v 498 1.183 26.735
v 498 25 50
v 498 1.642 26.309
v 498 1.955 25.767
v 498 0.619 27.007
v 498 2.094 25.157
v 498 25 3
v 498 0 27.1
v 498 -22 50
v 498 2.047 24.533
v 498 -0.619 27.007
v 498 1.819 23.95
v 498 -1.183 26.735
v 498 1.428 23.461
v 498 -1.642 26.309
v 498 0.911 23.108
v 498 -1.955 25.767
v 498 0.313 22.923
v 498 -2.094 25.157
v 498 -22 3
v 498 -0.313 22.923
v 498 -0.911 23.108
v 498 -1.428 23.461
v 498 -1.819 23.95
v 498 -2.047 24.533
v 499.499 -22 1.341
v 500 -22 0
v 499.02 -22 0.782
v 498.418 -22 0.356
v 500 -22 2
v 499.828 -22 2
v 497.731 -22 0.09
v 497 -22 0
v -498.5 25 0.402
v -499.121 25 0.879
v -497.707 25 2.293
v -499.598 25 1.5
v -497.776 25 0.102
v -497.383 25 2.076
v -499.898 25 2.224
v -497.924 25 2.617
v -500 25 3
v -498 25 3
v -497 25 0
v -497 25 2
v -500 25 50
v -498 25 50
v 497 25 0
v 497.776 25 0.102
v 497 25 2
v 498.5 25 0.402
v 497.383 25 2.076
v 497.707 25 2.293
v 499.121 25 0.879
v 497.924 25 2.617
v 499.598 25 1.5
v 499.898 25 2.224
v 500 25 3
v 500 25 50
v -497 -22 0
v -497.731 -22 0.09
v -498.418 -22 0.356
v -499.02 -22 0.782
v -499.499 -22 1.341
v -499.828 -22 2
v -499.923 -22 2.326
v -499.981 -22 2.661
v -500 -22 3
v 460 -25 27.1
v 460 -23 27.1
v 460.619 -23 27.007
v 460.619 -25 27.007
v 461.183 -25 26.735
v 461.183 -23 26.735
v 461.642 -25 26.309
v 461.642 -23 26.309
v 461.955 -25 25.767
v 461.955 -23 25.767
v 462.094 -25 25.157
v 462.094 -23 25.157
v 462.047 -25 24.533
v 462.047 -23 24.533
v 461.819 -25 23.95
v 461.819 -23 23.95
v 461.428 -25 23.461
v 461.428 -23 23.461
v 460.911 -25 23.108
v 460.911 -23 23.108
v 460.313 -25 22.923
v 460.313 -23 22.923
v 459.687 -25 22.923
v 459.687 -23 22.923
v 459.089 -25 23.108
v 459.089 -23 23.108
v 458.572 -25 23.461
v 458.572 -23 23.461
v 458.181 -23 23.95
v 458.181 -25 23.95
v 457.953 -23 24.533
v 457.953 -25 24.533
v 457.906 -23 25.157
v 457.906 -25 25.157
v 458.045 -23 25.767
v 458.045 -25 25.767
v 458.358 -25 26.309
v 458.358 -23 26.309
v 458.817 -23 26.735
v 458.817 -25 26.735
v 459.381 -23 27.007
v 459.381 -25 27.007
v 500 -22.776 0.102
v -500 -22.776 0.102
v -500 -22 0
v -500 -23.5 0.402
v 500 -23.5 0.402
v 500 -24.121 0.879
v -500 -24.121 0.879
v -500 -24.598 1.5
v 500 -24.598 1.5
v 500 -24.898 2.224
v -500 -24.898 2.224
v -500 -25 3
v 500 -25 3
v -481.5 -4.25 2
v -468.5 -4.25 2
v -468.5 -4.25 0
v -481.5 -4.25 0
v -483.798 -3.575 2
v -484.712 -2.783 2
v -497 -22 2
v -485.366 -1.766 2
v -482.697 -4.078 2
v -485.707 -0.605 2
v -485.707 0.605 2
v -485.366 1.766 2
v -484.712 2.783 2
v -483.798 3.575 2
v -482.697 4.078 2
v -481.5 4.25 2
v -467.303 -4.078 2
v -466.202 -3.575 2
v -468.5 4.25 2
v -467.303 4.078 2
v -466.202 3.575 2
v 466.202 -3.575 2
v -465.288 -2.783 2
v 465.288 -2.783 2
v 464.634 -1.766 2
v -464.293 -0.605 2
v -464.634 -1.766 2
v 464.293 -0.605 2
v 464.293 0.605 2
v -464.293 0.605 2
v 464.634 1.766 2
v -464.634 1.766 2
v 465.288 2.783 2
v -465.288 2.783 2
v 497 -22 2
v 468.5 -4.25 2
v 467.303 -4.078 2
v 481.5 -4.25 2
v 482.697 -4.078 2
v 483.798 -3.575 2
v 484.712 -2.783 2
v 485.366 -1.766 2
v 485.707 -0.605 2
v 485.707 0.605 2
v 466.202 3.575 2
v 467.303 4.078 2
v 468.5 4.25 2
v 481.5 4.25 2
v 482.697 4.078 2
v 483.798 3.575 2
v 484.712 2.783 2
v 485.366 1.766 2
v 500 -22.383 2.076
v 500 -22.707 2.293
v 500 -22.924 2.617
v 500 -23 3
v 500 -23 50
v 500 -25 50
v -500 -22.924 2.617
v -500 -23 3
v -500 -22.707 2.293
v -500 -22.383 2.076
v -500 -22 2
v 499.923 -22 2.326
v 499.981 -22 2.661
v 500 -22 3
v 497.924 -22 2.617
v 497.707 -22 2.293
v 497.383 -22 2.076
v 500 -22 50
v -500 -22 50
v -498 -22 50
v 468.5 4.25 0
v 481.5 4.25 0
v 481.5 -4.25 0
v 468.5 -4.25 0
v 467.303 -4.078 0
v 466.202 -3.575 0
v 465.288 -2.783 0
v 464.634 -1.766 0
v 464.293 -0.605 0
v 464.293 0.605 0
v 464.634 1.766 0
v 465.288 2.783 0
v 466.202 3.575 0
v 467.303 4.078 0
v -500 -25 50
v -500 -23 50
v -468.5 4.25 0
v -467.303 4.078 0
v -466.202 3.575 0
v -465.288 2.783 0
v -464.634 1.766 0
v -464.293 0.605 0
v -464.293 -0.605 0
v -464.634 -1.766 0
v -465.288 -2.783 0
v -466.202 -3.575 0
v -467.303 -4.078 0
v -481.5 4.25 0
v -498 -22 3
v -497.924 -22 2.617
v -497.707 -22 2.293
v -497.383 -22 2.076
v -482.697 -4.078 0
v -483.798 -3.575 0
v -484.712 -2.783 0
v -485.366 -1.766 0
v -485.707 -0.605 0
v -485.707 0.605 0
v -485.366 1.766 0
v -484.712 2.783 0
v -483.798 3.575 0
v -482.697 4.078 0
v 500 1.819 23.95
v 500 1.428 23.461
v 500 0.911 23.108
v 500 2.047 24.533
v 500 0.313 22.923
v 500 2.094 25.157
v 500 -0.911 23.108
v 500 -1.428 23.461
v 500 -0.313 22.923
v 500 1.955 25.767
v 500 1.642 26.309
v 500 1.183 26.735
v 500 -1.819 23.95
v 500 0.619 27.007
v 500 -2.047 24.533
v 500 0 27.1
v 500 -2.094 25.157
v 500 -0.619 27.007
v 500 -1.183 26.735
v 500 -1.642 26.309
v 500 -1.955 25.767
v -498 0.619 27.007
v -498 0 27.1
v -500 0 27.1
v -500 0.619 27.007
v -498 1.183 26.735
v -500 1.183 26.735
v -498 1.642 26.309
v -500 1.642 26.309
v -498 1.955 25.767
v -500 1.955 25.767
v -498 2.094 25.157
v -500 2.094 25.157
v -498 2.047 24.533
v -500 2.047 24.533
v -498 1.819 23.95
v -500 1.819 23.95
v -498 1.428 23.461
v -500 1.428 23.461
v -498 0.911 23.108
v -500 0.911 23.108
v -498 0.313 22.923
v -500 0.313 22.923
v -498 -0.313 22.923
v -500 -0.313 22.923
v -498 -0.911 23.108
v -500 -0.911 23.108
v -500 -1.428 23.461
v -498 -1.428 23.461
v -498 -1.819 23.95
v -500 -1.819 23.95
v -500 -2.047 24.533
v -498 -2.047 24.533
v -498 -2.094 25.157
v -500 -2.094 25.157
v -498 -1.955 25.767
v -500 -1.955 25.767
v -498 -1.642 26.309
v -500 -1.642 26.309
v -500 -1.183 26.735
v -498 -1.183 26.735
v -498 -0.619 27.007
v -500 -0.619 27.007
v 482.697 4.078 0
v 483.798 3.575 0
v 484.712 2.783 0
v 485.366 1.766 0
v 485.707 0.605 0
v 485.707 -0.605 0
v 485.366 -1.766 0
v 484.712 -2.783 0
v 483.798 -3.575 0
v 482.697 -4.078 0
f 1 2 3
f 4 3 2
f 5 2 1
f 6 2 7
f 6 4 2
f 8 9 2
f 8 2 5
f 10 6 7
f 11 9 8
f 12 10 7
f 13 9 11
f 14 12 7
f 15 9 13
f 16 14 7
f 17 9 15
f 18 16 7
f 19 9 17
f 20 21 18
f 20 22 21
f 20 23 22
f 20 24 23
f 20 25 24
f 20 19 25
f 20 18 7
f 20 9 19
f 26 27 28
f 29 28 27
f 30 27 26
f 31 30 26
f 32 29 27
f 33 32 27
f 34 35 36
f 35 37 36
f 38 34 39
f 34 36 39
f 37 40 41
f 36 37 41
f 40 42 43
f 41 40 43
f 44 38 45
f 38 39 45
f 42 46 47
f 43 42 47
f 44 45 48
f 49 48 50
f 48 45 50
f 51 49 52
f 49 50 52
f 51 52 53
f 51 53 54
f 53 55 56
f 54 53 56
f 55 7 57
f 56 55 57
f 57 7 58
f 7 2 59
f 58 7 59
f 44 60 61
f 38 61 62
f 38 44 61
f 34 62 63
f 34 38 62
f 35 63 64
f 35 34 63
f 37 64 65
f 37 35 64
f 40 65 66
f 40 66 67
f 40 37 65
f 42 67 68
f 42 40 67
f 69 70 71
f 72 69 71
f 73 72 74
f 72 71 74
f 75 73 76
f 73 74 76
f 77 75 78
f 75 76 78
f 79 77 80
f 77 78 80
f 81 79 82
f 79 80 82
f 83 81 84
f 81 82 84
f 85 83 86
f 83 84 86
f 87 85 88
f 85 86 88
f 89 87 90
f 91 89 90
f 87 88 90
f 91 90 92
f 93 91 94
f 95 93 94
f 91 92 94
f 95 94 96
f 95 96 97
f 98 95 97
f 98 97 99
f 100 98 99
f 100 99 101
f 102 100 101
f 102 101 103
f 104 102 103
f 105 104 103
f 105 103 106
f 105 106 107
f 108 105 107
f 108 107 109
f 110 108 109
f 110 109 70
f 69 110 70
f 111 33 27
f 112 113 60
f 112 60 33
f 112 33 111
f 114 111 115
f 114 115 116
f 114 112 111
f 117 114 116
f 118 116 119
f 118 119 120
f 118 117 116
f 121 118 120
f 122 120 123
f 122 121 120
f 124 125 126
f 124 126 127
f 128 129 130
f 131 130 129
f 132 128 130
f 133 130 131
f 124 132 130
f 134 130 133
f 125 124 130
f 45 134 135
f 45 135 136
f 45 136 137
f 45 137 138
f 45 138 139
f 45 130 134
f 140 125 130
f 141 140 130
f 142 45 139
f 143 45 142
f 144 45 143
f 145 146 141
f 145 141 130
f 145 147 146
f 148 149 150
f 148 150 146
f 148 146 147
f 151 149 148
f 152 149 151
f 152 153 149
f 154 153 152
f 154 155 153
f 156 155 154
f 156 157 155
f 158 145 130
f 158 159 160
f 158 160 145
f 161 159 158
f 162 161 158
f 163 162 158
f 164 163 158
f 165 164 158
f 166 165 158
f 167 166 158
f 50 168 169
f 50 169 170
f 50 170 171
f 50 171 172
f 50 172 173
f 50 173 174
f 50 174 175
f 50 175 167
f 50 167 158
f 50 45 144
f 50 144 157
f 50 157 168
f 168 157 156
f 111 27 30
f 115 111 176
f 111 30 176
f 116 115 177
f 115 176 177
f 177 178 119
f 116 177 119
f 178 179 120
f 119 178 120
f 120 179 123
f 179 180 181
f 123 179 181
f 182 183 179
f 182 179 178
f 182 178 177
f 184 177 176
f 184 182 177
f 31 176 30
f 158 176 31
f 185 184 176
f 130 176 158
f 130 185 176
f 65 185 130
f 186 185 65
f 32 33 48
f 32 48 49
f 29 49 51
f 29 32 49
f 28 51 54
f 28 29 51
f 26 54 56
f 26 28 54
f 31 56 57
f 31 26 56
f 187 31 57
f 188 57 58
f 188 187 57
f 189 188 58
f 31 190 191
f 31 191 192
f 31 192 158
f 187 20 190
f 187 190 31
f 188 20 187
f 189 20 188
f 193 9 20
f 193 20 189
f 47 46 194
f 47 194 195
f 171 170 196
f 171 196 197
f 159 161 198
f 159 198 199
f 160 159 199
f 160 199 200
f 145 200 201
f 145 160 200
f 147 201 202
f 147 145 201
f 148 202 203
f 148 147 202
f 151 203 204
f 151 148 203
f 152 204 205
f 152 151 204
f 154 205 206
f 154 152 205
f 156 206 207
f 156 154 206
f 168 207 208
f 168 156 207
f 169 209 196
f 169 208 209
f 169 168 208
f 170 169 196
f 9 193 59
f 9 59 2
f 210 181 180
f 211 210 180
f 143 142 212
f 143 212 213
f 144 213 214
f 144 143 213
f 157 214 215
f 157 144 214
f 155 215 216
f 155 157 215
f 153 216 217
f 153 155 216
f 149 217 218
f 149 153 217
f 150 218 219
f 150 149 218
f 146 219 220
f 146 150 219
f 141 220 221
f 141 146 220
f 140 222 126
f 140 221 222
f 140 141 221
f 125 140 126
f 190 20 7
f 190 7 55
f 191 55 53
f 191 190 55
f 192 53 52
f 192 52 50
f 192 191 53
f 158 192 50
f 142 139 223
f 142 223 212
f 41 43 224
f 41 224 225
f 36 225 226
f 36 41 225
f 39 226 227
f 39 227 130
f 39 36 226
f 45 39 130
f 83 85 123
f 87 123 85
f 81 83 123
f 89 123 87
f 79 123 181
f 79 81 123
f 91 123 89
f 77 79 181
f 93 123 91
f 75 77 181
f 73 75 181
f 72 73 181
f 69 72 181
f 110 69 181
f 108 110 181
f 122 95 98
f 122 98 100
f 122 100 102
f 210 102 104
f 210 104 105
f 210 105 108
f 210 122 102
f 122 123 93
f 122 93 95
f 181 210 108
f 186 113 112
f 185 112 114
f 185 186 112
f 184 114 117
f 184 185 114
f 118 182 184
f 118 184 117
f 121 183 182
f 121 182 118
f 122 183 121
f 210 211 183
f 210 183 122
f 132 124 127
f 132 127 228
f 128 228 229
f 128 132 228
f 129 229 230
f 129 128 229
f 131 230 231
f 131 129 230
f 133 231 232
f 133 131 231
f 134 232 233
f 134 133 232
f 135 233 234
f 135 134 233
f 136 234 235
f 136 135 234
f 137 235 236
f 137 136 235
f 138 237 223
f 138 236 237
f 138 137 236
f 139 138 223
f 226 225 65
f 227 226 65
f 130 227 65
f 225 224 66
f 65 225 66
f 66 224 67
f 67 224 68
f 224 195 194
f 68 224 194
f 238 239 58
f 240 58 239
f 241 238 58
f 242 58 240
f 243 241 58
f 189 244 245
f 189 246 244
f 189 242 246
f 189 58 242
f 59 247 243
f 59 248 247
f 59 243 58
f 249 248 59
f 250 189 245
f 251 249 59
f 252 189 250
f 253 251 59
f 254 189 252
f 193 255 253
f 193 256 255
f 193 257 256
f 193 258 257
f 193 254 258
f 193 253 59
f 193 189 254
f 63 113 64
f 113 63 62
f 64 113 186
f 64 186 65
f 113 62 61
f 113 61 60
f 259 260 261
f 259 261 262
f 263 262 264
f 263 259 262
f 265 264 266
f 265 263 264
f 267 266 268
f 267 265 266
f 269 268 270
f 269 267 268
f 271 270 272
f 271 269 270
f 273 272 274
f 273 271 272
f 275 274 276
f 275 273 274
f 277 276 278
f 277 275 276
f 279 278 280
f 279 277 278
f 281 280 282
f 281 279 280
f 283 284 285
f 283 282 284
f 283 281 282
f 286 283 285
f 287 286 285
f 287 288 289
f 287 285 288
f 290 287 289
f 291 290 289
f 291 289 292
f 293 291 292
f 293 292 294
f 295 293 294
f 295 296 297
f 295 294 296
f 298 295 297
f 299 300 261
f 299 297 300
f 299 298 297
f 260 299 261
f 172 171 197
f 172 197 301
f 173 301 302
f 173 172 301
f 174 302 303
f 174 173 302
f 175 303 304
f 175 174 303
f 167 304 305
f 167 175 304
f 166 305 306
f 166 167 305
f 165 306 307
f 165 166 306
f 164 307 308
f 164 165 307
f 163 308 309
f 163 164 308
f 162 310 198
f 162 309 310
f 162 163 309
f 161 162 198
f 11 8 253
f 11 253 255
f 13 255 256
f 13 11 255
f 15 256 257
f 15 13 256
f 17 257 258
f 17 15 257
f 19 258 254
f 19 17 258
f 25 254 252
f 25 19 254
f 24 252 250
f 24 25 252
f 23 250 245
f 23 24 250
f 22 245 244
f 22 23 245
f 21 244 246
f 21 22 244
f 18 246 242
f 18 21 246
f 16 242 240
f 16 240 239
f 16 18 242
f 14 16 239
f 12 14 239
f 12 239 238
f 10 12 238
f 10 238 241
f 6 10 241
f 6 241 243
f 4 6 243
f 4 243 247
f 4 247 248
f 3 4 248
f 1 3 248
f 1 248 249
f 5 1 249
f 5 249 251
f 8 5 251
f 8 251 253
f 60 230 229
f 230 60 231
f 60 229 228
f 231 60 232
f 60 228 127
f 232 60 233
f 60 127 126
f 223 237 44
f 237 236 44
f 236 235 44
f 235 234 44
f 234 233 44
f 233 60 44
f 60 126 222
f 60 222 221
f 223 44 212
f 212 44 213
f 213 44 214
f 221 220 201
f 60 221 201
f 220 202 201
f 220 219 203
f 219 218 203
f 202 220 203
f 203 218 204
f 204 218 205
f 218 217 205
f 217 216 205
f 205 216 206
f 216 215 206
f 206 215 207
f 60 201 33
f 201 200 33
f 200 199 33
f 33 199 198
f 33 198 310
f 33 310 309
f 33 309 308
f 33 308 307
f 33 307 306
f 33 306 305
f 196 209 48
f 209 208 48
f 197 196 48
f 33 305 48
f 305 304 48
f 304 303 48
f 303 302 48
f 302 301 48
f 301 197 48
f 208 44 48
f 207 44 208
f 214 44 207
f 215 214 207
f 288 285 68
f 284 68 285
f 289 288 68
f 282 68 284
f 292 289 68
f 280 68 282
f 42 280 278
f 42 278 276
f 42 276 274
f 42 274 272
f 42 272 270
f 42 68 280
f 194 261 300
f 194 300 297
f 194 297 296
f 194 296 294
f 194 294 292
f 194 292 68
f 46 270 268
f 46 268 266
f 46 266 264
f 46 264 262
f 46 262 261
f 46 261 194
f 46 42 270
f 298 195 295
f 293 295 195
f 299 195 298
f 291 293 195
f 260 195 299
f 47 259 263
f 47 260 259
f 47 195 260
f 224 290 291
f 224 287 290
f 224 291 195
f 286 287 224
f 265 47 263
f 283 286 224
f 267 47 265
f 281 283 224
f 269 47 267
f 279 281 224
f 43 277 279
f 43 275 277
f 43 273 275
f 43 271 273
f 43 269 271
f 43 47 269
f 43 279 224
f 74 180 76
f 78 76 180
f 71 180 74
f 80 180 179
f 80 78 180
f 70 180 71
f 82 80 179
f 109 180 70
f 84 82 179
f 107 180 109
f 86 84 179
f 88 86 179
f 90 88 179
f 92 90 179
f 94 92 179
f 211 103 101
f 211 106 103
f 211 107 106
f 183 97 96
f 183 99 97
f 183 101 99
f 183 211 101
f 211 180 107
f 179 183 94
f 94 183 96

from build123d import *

# Parameters (mm, degrees)
BASEFLANGE_W                 = 1000
BASEFLANGE_H                 = 50
BASEFLANGE1_DEPTH            = 2
EDGE_FLANGE2_STRIP_W         = 10
EDGE_FLANGE2_STRIP_H         = 2
EDGE_FLANGE2_STRIP_CUT_DEPTH = 1000
EDGE_FLANGE2_DEPTH           = 1000
SKETCH12_R                   = 2.1
F_4_2MM_HOLE_DEPTH           = 10
SLOT_1_DEPTH                 = 10
LEFT_EDGE_STRIP_W            = 10
LEFT_EDGE_STRIP_H            = 2
LEFT_EDGE_STRIP_CUT_DEPTH    = 47
LEFT_EDGE_DEPTH              = 47
CUT_EXTRUDE1_DEPTH           = 1002.561281201
CUT_EXTRUDE1_DEPTH_BACK      = 1002.561281201
SKETCH19_R                   = 2.1
RIGHT_EDGE_STRIP_W           = 10
RIGHT_EDGE_STRIP_H           = 2
RIGHT_EDGE_STRIP_CUT_DEPTH   = 47
RIGHT_EDGE_DEPTH             = 47
CUT_EXTRUDE2_START           = -10
SKETCH25_R                   = 2.1
CUT_EXTRUDE2_DEPTH           = 10


# Sheet-metal steps are written as plain solids
with BuildPart() as part:
    # BaseFlange → BaseFlange1 (new body)
    with BuildSketch(Plane.XY):
        Rectangle(BASEFLANGE_W, BASEFLANGE_H)
    extrude(amount=BASEFLANGE1_DEPTH)

    # Edge-Flange2 strip (across the edge) → Edge-Flange2 strip cut (cut)
    with BuildSketch(Plane(origin=(-500, -25, 2), x_dir=(0, 1, 0), z_dir=(1, 0, 0))):
        with Locations((-2, -1)):
            Rectangle(EDGE_FLANGE2_STRIP_W, EDGE_FLANGE2_STRIP_H)
    extrude(amount=EDGE_FLANGE2_STRIP_CUT_DEPTH, mode=Mode.SUBTRACT)

    # Edge-Flange2 section (across the edge) → Edge-Flange2 (add)
    with BuildSketch(Plane(origin=(-500, -25, 2), x_dir=(0, 1, 0), z_dir=(1, 0, 0))):
        with BuildLine():
            Line((0, 1), (0, 48))
            Line((0, 48), (2, 48))
            Line((2, 48), (2, 1))
            ThreePointArc((2, 1), (2.292893219, 0.292893219), (3, 0))
            Line((3, 0), (3, -2))
            ThreePointArc((3, -2), (0.878679656, -1.121320344), (0, 1))
        make_face()
    extrude(amount=EDGE_FLANGE2_DEPTH)

    # Sketch12 → 4.2mm Hole (cut)
    with BuildSketch(Plane(origin=(0, -23, 0), x_dir=(1, 0, 0), z_dir=(0, 1, 0))):
        with Locations(Location((460, -25, 0), (0, 0, 270))):
            Circle(SKETCH12_R)
    extrude(amount=-F_4_2MM_HOLE_DEPTH, mode=Mode.SUBTRACT)

    # slot1 → Slot 1 (cut)
    with BuildSketch(Plane.XY.offset(2)):
        with BuildLine():
            Line((468.5, 4.25), (481.5, 4.25))
            ThreePointArc((481.5, 4.25), (485.75, 0), (481.5, -4.25))
            Line((481.5, -4.25), (468.5, -4.25))
            ThreePointArc((468.5, -4.25), (464.25, 0), (468.5, 4.25))
        make_face()
    slot_1 = extrude(amount=-SLOT_1_DEPTH, mode=Mode.SUBTRACT)

    # Slot Pattern: Slot 1 at 1 more place
    with Locations((-950, 0, 0)):
        add(slot_1, mode=Mode.SUBTRACT)

    # Left Edge strip (across the edge) → Left Edge strip cut (cut)
    with BuildSketch(Plane(origin=(-500, 25, 2), x_dir=(1, 0, 0), z_dir=(0, -1, 0))):
        with Locations((-2, -1)):
            Rectangle(LEFT_EDGE_STRIP_W, LEFT_EDGE_STRIP_H)
    extrude(amount=LEFT_EDGE_STRIP_CUT_DEPTH, mode=Mode.SUBTRACT)

    # Left Edge section (across the edge) → Left Edge (add)
    with BuildSketch(Plane(origin=(-500, 25, 2), x_dir=(1, 0, 0), z_dir=(0, -1, 0))):
        with BuildLine():
            Line((0, 1), (0, 48))
            Line((0, 48), (2, 48))
            Line((2, 48), (2, 1))
            ThreePointArc((2, 1), (2.292893219, 0.292893219), (3, 0))
            Line((3, 0), (3, -2))
            ThreePointArc((3, -2), (0.878679656, -1.121320344), (0, 1))
        make_face()
    extrude(amount=LEFT_EDGE_DEPTH)

    # Sketch19 → Cut-Extrude1 (cut, two sides: drawn at the far end of the back side and taken through both)
    with BuildSketch(Plane.ZY.offset(500).offset(-CUT_EXTRUDE1_DEPTH_BACK)):
        with Locations((25, 0)):
            Circle(SKETCH19_R)
    extrude(amount=CUT_EXTRUDE1_DEPTH + CUT_EXTRUDE1_DEPTH_BACK, mode=Mode.SUBTRACT)

    # Right Edge strip (across the edge) → Right Edge strip cut (cut)
    with BuildSketch(Plane(origin=(500, -22, 2), x_dir=(-1, 0, 0), z_dir=(0, 1, 0))):
        with Locations((-2, -1)):
            Rectangle(RIGHT_EDGE_STRIP_W, RIGHT_EDGE_STRIP_H)
    extrude(amount=RIGHT_EDGE_STRIP_CUT_DEPTH, mode=Mode.SUBTRACT)

    # Right Edge section (across the edge) → Right Edge (add)
    with BuildSketch(Plane(origin=(500, -22, 2), x_dir=(-1, 0, 0), z_dir=(0, 1, 0))):
        with BuildLine():
            Line((0, 1), (0, 48))
            Line((0, 48), (2, 48))
            Line((2, 48), (2, 1))
            ThreePointArc((2, 1), (2.292893219, 0.292893219), (3, 0))
            Line((3, 0), (3, -2))
            ThreePointArc((3, -2), (0.878679656, -1.121320344), (0, 1))
        make_face()
    extrude(amount=RIGHT_EDGE_DEPTH)

    # Sketch25 → Cut-Extrude2 (cut)
    with BuildSketch(Plane(origin=(500, 0, 0), x_dir=(0, 0, -1), z_dir=(1, 0, 0)).offset(CUT_EXTRUDE2_START)):
        with Locations(Location((-25, 0, 0), (0, 0, 180))):
            Circle(SKETCH25_R)
    extrude(amount=CUT_EXTRUDE2_DEPTH, mode=Mode.SUBTRACT)


solid = part.part
